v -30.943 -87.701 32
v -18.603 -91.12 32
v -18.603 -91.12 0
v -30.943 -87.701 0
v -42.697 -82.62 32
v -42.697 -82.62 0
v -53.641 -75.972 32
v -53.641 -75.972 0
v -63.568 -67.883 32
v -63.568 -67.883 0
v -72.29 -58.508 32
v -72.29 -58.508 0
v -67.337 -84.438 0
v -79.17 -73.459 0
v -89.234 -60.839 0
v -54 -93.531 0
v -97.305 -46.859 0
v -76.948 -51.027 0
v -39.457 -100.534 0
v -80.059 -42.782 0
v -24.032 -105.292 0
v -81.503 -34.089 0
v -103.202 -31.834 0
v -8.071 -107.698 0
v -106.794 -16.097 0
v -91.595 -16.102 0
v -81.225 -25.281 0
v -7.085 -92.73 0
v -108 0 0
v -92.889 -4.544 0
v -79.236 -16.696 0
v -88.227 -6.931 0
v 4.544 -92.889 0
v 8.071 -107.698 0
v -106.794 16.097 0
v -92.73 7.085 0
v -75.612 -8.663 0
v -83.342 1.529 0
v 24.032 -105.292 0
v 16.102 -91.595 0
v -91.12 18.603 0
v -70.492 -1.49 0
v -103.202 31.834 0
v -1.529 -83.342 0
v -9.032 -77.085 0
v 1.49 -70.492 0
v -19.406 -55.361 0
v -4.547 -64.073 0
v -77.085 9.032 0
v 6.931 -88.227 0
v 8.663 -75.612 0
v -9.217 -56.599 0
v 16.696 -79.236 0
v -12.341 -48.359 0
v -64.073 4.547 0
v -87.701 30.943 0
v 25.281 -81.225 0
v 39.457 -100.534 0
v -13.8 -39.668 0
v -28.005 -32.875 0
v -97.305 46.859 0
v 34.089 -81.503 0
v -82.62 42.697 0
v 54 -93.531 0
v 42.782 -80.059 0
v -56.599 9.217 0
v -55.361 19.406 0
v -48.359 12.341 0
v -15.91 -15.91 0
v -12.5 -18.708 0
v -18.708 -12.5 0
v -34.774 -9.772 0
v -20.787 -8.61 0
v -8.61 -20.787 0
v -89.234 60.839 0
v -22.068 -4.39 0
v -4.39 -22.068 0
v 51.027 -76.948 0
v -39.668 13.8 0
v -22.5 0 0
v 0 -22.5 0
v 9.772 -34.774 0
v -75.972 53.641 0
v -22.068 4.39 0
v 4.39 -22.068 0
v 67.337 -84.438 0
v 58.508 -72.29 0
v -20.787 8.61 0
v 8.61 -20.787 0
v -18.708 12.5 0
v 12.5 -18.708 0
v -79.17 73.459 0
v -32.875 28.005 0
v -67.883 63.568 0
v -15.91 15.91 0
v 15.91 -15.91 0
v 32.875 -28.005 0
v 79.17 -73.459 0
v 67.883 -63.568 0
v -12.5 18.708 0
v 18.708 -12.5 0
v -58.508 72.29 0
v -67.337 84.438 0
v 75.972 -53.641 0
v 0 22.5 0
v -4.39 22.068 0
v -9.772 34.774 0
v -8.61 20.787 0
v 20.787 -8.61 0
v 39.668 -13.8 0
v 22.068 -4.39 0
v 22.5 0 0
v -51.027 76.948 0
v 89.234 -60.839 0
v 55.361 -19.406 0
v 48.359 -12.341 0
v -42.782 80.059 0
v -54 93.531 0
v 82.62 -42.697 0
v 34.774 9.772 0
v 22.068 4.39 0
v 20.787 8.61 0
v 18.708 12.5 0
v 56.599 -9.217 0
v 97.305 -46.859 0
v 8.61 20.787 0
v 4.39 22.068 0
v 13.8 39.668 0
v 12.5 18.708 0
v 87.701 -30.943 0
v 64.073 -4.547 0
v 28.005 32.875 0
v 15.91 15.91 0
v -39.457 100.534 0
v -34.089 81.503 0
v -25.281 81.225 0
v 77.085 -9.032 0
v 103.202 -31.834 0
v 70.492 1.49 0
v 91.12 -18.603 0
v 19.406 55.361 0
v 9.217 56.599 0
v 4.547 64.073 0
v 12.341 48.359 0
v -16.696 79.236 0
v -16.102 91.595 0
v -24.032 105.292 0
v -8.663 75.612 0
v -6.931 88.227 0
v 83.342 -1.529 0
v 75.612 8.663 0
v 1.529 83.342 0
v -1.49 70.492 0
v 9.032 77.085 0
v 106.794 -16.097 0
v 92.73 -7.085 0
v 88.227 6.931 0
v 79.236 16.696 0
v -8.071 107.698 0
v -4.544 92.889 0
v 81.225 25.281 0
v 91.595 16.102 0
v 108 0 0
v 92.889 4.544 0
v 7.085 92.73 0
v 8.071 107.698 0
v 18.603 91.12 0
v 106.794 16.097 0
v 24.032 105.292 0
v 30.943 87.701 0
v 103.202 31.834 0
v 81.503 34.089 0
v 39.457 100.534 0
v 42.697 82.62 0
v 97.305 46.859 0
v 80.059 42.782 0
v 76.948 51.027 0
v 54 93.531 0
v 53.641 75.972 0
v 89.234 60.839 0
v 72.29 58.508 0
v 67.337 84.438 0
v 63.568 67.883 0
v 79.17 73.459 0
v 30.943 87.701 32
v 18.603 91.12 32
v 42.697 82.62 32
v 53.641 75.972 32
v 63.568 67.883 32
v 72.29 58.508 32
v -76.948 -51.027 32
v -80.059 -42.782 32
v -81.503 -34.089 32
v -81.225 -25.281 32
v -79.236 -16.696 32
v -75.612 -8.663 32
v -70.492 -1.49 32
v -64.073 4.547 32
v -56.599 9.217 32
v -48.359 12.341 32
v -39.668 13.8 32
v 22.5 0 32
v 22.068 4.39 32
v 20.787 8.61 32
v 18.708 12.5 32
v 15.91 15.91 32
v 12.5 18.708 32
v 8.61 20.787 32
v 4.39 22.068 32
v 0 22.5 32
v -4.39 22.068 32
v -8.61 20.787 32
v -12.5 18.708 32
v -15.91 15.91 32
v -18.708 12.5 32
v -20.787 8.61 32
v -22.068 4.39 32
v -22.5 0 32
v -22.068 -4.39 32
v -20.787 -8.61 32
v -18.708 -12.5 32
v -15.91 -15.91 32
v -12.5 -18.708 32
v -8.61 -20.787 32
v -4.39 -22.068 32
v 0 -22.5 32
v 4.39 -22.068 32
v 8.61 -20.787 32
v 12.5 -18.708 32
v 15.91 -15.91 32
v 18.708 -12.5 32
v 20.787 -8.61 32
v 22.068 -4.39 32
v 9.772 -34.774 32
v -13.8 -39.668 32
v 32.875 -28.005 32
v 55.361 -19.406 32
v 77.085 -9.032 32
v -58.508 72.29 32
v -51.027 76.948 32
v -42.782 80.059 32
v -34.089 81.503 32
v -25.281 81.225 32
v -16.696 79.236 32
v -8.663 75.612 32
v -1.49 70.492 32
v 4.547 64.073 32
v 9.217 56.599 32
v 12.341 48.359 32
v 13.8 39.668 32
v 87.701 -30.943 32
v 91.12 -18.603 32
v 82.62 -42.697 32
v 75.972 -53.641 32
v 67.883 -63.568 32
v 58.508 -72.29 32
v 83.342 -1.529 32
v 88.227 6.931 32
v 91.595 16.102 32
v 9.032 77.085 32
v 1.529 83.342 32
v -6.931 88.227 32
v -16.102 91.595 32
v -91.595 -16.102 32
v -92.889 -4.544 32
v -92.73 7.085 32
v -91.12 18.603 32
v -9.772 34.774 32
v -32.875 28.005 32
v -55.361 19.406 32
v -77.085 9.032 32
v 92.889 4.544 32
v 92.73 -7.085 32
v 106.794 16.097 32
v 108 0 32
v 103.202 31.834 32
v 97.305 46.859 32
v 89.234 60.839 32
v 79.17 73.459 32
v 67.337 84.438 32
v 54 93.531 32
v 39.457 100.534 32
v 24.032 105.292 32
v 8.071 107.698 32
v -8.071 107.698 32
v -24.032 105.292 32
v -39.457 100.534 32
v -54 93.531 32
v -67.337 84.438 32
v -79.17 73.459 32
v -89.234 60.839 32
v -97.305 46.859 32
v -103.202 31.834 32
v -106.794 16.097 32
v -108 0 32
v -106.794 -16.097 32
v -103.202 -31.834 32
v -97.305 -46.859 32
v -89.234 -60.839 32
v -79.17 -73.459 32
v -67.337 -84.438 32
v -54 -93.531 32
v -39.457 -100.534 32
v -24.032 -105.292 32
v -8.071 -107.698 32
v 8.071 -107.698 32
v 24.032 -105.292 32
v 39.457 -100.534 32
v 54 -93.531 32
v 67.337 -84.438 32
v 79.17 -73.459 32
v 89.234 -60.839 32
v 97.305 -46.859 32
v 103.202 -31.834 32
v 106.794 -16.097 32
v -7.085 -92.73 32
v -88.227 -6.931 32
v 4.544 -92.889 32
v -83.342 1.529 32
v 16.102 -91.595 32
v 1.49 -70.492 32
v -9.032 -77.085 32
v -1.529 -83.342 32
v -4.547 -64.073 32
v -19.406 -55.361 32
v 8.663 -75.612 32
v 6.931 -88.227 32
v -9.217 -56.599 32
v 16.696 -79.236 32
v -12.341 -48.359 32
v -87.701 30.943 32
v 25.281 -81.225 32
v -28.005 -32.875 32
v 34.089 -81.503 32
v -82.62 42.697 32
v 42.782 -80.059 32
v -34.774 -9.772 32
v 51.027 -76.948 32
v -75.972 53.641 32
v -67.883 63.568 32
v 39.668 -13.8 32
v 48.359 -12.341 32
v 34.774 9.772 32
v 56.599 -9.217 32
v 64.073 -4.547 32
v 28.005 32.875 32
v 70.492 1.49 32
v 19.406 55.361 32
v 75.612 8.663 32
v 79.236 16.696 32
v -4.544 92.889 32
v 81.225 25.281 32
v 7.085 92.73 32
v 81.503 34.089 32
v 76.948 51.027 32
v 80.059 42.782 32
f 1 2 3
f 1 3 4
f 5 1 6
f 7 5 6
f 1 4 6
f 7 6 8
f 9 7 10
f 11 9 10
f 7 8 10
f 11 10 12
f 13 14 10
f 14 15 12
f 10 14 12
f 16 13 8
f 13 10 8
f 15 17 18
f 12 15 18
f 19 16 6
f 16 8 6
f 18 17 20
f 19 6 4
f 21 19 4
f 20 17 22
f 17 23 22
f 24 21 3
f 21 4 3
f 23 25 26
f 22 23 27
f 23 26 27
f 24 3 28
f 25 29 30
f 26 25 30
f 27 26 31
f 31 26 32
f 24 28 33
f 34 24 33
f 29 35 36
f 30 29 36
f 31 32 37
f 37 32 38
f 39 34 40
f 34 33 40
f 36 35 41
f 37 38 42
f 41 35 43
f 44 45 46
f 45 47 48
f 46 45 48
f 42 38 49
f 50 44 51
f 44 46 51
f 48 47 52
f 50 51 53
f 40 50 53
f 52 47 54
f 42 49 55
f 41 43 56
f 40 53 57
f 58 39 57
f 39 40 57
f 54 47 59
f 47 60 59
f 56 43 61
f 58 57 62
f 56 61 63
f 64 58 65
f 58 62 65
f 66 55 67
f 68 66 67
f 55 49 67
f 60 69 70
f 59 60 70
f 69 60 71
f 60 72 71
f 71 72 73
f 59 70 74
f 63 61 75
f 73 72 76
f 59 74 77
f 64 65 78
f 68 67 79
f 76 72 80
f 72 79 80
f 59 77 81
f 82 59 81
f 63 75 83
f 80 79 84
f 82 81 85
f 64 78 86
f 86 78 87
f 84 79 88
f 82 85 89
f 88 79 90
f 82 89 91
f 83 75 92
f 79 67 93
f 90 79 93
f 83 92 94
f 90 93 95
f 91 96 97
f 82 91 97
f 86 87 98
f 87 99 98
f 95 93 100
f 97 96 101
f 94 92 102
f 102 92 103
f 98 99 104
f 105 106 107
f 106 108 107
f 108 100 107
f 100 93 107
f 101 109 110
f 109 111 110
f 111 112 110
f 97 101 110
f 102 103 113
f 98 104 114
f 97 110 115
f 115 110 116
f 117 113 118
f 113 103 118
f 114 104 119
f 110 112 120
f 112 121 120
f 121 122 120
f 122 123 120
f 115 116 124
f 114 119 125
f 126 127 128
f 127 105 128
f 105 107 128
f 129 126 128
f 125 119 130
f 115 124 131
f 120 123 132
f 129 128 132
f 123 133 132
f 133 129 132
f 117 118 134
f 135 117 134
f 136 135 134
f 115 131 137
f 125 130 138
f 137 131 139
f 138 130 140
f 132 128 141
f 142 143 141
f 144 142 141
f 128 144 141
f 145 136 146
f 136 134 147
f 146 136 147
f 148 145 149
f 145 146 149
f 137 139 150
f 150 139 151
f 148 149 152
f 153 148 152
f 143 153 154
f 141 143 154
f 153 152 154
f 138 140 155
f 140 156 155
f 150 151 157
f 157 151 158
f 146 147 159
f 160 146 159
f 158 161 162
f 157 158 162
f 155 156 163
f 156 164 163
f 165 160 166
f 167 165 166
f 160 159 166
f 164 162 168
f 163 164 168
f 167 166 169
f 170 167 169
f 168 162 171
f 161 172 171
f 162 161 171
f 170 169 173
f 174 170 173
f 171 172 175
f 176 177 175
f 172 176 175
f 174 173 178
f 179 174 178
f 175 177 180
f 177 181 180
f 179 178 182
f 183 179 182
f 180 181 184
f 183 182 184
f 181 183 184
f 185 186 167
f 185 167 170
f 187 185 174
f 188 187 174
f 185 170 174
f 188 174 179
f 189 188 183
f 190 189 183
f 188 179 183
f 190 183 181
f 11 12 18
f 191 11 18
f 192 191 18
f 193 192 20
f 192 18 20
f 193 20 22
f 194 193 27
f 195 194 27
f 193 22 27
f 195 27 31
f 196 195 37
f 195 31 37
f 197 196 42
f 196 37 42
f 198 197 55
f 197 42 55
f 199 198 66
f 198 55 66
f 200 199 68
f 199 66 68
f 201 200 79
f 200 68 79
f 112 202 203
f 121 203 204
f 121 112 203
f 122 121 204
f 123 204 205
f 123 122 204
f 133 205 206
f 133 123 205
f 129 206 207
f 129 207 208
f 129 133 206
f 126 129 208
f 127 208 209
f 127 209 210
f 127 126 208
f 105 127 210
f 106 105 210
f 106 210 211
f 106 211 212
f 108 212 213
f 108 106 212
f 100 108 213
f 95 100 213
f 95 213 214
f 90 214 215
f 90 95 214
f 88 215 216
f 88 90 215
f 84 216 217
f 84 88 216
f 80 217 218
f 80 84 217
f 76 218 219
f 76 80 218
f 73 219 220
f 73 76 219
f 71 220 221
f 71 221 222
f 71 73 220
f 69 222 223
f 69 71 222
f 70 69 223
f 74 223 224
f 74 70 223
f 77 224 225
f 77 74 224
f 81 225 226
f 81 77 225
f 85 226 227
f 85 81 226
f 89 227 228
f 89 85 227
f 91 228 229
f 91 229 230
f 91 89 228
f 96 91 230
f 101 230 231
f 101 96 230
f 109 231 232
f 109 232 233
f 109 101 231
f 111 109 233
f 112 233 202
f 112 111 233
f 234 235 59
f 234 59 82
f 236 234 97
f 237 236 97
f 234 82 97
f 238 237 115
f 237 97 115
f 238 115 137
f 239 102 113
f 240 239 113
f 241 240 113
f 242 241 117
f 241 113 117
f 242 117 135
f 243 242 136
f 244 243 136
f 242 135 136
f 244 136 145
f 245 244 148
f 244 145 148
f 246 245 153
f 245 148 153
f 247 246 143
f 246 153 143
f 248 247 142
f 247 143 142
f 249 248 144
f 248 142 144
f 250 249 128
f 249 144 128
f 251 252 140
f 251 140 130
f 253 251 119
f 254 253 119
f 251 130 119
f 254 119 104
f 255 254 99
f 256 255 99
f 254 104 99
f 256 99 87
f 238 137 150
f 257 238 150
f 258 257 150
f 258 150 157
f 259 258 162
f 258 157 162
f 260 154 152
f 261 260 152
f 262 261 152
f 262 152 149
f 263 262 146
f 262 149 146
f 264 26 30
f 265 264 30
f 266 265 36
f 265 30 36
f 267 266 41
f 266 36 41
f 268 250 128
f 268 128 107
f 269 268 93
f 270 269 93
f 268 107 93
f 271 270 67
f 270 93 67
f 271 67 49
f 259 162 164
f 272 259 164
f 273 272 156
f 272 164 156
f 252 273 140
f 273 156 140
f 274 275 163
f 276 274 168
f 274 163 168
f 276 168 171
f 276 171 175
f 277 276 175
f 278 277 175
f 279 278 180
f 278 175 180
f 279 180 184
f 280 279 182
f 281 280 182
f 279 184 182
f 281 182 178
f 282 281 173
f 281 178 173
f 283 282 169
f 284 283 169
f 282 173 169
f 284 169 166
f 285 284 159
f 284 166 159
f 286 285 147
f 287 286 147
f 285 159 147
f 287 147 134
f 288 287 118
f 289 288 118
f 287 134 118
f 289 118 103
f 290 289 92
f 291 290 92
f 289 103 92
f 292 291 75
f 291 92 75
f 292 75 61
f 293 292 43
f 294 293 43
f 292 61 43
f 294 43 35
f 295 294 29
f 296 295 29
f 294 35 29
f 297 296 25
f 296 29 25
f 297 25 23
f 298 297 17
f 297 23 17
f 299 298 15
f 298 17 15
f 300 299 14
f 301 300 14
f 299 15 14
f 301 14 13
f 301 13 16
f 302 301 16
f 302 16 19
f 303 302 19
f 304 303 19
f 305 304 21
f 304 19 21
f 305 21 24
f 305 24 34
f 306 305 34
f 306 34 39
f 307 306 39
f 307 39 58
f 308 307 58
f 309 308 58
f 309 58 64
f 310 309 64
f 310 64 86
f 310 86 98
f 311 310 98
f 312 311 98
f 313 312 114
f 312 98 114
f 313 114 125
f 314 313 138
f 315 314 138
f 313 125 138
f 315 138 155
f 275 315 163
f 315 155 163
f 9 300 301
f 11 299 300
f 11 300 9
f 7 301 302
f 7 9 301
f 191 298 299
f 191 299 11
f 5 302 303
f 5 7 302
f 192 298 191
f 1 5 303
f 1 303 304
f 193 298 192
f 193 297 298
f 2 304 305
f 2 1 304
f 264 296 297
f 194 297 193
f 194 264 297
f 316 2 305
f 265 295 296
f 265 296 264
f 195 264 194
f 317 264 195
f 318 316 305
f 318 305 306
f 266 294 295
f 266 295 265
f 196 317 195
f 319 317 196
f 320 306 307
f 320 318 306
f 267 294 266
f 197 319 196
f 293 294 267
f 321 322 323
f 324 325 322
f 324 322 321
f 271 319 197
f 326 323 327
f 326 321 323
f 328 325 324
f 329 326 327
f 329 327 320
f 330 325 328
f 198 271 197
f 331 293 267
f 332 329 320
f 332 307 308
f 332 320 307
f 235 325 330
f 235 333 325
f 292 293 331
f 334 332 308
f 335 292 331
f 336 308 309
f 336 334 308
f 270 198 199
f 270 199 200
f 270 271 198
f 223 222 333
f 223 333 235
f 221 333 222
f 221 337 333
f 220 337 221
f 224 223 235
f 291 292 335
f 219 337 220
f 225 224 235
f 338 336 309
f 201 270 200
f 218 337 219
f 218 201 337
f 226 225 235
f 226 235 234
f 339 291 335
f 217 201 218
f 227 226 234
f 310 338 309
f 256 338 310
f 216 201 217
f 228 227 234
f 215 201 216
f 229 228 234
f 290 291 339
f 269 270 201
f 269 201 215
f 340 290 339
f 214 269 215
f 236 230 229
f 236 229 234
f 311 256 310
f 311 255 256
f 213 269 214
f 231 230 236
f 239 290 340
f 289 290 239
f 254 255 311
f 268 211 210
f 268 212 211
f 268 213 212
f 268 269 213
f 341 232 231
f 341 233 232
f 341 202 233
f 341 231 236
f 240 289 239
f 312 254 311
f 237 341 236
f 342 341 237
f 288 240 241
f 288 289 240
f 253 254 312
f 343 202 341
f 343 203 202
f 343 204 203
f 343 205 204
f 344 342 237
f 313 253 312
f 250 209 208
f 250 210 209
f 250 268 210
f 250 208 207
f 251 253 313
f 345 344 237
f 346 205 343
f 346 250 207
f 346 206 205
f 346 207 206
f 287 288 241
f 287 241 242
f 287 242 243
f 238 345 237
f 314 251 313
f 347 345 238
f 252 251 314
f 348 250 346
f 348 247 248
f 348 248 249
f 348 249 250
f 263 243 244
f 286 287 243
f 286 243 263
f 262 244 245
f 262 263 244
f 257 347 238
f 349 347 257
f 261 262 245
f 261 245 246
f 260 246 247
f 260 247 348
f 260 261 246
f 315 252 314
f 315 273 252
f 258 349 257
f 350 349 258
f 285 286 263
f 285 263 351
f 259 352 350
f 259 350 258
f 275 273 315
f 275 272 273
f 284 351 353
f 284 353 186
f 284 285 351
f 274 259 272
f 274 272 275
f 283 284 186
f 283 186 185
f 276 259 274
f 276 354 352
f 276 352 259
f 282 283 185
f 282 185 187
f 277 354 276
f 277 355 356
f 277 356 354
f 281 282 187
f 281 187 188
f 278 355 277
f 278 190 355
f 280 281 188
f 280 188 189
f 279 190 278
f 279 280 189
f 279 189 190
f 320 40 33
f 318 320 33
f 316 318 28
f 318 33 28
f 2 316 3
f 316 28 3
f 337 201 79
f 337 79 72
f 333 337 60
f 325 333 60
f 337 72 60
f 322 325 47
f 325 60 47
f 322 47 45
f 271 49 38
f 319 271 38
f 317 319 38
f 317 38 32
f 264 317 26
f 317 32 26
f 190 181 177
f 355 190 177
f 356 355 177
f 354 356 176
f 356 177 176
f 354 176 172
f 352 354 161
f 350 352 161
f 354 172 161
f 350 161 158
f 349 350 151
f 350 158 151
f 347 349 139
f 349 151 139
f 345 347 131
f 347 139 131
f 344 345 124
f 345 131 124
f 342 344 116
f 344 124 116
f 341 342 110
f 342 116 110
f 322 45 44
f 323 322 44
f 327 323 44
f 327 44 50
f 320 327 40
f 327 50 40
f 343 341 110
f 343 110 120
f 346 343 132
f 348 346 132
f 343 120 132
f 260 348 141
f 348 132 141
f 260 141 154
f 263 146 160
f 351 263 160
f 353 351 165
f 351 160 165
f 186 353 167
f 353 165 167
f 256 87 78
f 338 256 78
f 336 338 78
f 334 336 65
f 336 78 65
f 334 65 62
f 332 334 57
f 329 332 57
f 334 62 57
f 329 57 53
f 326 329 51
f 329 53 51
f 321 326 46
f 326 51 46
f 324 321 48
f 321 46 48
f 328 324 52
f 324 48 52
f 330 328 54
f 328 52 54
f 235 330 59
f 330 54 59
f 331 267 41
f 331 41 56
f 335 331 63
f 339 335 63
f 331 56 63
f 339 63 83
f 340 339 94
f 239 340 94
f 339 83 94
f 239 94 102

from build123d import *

# Parameters (mm, degrees)
SKETCH1_R           = 108
SKETCH1_R_2         = 22.5
BOSS_EXTRUDE2_DEPTH = 32


with BuildPart() as part:
    # Sketch1 → Boss-Extrude2 (new body)
    with BuildSketch(Plane.XY):
        Circle(SKETCH1_R)
        with BuildLine():
            ThreePointArc((-39.668209022, 13.799753366), (-28.005440993, -32.874640461), (-9.031806484, -77.084598511))
            ThreePointArc((-9.031806484, -77.084598511), (2.596198221, -85.966451462), (16.102221796, -91.595406289))
            ThreePointArc((16.102221796, -91.595406289), (-1.272703942, -92.991291123), (-18.602920008, -91.120422339))
            ThreePointArc((-18.602920008, -91.120422339), (-48.283083898, -79.484236232), (-72.289675848, -58.508142731))
            ThreePointArc((-72.289675848, -58.508142731), (-77.621570163, -12.590195167), (-39.668209022, 13.799753366))
        make_face(mode=Mode.SUBTRACT)
        with BuildLine():
            ThreePointArc((-13.799753366, -39.668209022), (32.874640461, -28.005440993), (77.084598511, -9.031806484))
            ThreePointArc((77.084598511, -9.031806484), (85.966451462, 2.596198221), (91.595406289, 16.102221796))
            ThreePointArc((91.595406289, 16.102221796), (92.991291123, -1.272703942), (91.120422339, -18.602920008))
            ThreePointArc((91.120422339, -18.602920008), (79.484236232, -48.283083898), (58.508142731, -72.289675848))
            ThreePointArc((58.508142731, -72.289675848), (12.590195167, -77.621570163), (-13.799753366, -39.668209022))
        make_face(mode=Mode.SUBTRACT)
        with BuildLine():
            ThreePointArc((13.799753366, 39.668209022), (-32.874640461, 28.005440993), (-77.084598511, 9.031806484))
            ThreePointArc((-77.084598511, 9.031806484), (-85.966451462, -2.596198221), (-91.595406289, -16.102221796))
            ThreePointArc((-91.595406289, -16.102221796), (-92.991291123, 1.272703942), (-91.120422339, 18.602920008))
            ThreePointArc((-91.120422339, 18.602920008), (-79.484236232, 48.283083898), (-58.508142731, 72.289675848))
            ThreePointArc((-58.508142731, 72.289675848), (-12.590195167, 77.621570163), (13.799753366, 39.668209022))
        make_face(mode=Mode.SUBTRACT)
        Circle(SKETCH1_R_2, mode=Mode.SUBTRACT)
        with BuildLine():
            ThreePointArc((39.668209022, -13.799753366), (28.005440993, 32.874640461), (9.031806484, 77.084598511))
            ThreePointArc((9.031806484, 77.084598511), (-2.596198221, 85.966451462), (-16.102221796, 91.595406289))
            ThreePointArc((-16.102221796, 91.595406289), (1.272703942, 92.991291123), (18.602920008, 91.120422339))
            ThreePointArc((18.602920008, 91.120422339), (48.283083898, 79.484236232), (72.289675848, 58.508142731))
            ThreePointArc((72.289675848, 58.508142731), (77.621570163, 12.590195167), (39.668209022, -13.799753366))
        make_face(mode=Mode.SUBTRACT)
    extrude(amount=BOSS_EXTRUDE2_DEPTH)


solid = part.part
